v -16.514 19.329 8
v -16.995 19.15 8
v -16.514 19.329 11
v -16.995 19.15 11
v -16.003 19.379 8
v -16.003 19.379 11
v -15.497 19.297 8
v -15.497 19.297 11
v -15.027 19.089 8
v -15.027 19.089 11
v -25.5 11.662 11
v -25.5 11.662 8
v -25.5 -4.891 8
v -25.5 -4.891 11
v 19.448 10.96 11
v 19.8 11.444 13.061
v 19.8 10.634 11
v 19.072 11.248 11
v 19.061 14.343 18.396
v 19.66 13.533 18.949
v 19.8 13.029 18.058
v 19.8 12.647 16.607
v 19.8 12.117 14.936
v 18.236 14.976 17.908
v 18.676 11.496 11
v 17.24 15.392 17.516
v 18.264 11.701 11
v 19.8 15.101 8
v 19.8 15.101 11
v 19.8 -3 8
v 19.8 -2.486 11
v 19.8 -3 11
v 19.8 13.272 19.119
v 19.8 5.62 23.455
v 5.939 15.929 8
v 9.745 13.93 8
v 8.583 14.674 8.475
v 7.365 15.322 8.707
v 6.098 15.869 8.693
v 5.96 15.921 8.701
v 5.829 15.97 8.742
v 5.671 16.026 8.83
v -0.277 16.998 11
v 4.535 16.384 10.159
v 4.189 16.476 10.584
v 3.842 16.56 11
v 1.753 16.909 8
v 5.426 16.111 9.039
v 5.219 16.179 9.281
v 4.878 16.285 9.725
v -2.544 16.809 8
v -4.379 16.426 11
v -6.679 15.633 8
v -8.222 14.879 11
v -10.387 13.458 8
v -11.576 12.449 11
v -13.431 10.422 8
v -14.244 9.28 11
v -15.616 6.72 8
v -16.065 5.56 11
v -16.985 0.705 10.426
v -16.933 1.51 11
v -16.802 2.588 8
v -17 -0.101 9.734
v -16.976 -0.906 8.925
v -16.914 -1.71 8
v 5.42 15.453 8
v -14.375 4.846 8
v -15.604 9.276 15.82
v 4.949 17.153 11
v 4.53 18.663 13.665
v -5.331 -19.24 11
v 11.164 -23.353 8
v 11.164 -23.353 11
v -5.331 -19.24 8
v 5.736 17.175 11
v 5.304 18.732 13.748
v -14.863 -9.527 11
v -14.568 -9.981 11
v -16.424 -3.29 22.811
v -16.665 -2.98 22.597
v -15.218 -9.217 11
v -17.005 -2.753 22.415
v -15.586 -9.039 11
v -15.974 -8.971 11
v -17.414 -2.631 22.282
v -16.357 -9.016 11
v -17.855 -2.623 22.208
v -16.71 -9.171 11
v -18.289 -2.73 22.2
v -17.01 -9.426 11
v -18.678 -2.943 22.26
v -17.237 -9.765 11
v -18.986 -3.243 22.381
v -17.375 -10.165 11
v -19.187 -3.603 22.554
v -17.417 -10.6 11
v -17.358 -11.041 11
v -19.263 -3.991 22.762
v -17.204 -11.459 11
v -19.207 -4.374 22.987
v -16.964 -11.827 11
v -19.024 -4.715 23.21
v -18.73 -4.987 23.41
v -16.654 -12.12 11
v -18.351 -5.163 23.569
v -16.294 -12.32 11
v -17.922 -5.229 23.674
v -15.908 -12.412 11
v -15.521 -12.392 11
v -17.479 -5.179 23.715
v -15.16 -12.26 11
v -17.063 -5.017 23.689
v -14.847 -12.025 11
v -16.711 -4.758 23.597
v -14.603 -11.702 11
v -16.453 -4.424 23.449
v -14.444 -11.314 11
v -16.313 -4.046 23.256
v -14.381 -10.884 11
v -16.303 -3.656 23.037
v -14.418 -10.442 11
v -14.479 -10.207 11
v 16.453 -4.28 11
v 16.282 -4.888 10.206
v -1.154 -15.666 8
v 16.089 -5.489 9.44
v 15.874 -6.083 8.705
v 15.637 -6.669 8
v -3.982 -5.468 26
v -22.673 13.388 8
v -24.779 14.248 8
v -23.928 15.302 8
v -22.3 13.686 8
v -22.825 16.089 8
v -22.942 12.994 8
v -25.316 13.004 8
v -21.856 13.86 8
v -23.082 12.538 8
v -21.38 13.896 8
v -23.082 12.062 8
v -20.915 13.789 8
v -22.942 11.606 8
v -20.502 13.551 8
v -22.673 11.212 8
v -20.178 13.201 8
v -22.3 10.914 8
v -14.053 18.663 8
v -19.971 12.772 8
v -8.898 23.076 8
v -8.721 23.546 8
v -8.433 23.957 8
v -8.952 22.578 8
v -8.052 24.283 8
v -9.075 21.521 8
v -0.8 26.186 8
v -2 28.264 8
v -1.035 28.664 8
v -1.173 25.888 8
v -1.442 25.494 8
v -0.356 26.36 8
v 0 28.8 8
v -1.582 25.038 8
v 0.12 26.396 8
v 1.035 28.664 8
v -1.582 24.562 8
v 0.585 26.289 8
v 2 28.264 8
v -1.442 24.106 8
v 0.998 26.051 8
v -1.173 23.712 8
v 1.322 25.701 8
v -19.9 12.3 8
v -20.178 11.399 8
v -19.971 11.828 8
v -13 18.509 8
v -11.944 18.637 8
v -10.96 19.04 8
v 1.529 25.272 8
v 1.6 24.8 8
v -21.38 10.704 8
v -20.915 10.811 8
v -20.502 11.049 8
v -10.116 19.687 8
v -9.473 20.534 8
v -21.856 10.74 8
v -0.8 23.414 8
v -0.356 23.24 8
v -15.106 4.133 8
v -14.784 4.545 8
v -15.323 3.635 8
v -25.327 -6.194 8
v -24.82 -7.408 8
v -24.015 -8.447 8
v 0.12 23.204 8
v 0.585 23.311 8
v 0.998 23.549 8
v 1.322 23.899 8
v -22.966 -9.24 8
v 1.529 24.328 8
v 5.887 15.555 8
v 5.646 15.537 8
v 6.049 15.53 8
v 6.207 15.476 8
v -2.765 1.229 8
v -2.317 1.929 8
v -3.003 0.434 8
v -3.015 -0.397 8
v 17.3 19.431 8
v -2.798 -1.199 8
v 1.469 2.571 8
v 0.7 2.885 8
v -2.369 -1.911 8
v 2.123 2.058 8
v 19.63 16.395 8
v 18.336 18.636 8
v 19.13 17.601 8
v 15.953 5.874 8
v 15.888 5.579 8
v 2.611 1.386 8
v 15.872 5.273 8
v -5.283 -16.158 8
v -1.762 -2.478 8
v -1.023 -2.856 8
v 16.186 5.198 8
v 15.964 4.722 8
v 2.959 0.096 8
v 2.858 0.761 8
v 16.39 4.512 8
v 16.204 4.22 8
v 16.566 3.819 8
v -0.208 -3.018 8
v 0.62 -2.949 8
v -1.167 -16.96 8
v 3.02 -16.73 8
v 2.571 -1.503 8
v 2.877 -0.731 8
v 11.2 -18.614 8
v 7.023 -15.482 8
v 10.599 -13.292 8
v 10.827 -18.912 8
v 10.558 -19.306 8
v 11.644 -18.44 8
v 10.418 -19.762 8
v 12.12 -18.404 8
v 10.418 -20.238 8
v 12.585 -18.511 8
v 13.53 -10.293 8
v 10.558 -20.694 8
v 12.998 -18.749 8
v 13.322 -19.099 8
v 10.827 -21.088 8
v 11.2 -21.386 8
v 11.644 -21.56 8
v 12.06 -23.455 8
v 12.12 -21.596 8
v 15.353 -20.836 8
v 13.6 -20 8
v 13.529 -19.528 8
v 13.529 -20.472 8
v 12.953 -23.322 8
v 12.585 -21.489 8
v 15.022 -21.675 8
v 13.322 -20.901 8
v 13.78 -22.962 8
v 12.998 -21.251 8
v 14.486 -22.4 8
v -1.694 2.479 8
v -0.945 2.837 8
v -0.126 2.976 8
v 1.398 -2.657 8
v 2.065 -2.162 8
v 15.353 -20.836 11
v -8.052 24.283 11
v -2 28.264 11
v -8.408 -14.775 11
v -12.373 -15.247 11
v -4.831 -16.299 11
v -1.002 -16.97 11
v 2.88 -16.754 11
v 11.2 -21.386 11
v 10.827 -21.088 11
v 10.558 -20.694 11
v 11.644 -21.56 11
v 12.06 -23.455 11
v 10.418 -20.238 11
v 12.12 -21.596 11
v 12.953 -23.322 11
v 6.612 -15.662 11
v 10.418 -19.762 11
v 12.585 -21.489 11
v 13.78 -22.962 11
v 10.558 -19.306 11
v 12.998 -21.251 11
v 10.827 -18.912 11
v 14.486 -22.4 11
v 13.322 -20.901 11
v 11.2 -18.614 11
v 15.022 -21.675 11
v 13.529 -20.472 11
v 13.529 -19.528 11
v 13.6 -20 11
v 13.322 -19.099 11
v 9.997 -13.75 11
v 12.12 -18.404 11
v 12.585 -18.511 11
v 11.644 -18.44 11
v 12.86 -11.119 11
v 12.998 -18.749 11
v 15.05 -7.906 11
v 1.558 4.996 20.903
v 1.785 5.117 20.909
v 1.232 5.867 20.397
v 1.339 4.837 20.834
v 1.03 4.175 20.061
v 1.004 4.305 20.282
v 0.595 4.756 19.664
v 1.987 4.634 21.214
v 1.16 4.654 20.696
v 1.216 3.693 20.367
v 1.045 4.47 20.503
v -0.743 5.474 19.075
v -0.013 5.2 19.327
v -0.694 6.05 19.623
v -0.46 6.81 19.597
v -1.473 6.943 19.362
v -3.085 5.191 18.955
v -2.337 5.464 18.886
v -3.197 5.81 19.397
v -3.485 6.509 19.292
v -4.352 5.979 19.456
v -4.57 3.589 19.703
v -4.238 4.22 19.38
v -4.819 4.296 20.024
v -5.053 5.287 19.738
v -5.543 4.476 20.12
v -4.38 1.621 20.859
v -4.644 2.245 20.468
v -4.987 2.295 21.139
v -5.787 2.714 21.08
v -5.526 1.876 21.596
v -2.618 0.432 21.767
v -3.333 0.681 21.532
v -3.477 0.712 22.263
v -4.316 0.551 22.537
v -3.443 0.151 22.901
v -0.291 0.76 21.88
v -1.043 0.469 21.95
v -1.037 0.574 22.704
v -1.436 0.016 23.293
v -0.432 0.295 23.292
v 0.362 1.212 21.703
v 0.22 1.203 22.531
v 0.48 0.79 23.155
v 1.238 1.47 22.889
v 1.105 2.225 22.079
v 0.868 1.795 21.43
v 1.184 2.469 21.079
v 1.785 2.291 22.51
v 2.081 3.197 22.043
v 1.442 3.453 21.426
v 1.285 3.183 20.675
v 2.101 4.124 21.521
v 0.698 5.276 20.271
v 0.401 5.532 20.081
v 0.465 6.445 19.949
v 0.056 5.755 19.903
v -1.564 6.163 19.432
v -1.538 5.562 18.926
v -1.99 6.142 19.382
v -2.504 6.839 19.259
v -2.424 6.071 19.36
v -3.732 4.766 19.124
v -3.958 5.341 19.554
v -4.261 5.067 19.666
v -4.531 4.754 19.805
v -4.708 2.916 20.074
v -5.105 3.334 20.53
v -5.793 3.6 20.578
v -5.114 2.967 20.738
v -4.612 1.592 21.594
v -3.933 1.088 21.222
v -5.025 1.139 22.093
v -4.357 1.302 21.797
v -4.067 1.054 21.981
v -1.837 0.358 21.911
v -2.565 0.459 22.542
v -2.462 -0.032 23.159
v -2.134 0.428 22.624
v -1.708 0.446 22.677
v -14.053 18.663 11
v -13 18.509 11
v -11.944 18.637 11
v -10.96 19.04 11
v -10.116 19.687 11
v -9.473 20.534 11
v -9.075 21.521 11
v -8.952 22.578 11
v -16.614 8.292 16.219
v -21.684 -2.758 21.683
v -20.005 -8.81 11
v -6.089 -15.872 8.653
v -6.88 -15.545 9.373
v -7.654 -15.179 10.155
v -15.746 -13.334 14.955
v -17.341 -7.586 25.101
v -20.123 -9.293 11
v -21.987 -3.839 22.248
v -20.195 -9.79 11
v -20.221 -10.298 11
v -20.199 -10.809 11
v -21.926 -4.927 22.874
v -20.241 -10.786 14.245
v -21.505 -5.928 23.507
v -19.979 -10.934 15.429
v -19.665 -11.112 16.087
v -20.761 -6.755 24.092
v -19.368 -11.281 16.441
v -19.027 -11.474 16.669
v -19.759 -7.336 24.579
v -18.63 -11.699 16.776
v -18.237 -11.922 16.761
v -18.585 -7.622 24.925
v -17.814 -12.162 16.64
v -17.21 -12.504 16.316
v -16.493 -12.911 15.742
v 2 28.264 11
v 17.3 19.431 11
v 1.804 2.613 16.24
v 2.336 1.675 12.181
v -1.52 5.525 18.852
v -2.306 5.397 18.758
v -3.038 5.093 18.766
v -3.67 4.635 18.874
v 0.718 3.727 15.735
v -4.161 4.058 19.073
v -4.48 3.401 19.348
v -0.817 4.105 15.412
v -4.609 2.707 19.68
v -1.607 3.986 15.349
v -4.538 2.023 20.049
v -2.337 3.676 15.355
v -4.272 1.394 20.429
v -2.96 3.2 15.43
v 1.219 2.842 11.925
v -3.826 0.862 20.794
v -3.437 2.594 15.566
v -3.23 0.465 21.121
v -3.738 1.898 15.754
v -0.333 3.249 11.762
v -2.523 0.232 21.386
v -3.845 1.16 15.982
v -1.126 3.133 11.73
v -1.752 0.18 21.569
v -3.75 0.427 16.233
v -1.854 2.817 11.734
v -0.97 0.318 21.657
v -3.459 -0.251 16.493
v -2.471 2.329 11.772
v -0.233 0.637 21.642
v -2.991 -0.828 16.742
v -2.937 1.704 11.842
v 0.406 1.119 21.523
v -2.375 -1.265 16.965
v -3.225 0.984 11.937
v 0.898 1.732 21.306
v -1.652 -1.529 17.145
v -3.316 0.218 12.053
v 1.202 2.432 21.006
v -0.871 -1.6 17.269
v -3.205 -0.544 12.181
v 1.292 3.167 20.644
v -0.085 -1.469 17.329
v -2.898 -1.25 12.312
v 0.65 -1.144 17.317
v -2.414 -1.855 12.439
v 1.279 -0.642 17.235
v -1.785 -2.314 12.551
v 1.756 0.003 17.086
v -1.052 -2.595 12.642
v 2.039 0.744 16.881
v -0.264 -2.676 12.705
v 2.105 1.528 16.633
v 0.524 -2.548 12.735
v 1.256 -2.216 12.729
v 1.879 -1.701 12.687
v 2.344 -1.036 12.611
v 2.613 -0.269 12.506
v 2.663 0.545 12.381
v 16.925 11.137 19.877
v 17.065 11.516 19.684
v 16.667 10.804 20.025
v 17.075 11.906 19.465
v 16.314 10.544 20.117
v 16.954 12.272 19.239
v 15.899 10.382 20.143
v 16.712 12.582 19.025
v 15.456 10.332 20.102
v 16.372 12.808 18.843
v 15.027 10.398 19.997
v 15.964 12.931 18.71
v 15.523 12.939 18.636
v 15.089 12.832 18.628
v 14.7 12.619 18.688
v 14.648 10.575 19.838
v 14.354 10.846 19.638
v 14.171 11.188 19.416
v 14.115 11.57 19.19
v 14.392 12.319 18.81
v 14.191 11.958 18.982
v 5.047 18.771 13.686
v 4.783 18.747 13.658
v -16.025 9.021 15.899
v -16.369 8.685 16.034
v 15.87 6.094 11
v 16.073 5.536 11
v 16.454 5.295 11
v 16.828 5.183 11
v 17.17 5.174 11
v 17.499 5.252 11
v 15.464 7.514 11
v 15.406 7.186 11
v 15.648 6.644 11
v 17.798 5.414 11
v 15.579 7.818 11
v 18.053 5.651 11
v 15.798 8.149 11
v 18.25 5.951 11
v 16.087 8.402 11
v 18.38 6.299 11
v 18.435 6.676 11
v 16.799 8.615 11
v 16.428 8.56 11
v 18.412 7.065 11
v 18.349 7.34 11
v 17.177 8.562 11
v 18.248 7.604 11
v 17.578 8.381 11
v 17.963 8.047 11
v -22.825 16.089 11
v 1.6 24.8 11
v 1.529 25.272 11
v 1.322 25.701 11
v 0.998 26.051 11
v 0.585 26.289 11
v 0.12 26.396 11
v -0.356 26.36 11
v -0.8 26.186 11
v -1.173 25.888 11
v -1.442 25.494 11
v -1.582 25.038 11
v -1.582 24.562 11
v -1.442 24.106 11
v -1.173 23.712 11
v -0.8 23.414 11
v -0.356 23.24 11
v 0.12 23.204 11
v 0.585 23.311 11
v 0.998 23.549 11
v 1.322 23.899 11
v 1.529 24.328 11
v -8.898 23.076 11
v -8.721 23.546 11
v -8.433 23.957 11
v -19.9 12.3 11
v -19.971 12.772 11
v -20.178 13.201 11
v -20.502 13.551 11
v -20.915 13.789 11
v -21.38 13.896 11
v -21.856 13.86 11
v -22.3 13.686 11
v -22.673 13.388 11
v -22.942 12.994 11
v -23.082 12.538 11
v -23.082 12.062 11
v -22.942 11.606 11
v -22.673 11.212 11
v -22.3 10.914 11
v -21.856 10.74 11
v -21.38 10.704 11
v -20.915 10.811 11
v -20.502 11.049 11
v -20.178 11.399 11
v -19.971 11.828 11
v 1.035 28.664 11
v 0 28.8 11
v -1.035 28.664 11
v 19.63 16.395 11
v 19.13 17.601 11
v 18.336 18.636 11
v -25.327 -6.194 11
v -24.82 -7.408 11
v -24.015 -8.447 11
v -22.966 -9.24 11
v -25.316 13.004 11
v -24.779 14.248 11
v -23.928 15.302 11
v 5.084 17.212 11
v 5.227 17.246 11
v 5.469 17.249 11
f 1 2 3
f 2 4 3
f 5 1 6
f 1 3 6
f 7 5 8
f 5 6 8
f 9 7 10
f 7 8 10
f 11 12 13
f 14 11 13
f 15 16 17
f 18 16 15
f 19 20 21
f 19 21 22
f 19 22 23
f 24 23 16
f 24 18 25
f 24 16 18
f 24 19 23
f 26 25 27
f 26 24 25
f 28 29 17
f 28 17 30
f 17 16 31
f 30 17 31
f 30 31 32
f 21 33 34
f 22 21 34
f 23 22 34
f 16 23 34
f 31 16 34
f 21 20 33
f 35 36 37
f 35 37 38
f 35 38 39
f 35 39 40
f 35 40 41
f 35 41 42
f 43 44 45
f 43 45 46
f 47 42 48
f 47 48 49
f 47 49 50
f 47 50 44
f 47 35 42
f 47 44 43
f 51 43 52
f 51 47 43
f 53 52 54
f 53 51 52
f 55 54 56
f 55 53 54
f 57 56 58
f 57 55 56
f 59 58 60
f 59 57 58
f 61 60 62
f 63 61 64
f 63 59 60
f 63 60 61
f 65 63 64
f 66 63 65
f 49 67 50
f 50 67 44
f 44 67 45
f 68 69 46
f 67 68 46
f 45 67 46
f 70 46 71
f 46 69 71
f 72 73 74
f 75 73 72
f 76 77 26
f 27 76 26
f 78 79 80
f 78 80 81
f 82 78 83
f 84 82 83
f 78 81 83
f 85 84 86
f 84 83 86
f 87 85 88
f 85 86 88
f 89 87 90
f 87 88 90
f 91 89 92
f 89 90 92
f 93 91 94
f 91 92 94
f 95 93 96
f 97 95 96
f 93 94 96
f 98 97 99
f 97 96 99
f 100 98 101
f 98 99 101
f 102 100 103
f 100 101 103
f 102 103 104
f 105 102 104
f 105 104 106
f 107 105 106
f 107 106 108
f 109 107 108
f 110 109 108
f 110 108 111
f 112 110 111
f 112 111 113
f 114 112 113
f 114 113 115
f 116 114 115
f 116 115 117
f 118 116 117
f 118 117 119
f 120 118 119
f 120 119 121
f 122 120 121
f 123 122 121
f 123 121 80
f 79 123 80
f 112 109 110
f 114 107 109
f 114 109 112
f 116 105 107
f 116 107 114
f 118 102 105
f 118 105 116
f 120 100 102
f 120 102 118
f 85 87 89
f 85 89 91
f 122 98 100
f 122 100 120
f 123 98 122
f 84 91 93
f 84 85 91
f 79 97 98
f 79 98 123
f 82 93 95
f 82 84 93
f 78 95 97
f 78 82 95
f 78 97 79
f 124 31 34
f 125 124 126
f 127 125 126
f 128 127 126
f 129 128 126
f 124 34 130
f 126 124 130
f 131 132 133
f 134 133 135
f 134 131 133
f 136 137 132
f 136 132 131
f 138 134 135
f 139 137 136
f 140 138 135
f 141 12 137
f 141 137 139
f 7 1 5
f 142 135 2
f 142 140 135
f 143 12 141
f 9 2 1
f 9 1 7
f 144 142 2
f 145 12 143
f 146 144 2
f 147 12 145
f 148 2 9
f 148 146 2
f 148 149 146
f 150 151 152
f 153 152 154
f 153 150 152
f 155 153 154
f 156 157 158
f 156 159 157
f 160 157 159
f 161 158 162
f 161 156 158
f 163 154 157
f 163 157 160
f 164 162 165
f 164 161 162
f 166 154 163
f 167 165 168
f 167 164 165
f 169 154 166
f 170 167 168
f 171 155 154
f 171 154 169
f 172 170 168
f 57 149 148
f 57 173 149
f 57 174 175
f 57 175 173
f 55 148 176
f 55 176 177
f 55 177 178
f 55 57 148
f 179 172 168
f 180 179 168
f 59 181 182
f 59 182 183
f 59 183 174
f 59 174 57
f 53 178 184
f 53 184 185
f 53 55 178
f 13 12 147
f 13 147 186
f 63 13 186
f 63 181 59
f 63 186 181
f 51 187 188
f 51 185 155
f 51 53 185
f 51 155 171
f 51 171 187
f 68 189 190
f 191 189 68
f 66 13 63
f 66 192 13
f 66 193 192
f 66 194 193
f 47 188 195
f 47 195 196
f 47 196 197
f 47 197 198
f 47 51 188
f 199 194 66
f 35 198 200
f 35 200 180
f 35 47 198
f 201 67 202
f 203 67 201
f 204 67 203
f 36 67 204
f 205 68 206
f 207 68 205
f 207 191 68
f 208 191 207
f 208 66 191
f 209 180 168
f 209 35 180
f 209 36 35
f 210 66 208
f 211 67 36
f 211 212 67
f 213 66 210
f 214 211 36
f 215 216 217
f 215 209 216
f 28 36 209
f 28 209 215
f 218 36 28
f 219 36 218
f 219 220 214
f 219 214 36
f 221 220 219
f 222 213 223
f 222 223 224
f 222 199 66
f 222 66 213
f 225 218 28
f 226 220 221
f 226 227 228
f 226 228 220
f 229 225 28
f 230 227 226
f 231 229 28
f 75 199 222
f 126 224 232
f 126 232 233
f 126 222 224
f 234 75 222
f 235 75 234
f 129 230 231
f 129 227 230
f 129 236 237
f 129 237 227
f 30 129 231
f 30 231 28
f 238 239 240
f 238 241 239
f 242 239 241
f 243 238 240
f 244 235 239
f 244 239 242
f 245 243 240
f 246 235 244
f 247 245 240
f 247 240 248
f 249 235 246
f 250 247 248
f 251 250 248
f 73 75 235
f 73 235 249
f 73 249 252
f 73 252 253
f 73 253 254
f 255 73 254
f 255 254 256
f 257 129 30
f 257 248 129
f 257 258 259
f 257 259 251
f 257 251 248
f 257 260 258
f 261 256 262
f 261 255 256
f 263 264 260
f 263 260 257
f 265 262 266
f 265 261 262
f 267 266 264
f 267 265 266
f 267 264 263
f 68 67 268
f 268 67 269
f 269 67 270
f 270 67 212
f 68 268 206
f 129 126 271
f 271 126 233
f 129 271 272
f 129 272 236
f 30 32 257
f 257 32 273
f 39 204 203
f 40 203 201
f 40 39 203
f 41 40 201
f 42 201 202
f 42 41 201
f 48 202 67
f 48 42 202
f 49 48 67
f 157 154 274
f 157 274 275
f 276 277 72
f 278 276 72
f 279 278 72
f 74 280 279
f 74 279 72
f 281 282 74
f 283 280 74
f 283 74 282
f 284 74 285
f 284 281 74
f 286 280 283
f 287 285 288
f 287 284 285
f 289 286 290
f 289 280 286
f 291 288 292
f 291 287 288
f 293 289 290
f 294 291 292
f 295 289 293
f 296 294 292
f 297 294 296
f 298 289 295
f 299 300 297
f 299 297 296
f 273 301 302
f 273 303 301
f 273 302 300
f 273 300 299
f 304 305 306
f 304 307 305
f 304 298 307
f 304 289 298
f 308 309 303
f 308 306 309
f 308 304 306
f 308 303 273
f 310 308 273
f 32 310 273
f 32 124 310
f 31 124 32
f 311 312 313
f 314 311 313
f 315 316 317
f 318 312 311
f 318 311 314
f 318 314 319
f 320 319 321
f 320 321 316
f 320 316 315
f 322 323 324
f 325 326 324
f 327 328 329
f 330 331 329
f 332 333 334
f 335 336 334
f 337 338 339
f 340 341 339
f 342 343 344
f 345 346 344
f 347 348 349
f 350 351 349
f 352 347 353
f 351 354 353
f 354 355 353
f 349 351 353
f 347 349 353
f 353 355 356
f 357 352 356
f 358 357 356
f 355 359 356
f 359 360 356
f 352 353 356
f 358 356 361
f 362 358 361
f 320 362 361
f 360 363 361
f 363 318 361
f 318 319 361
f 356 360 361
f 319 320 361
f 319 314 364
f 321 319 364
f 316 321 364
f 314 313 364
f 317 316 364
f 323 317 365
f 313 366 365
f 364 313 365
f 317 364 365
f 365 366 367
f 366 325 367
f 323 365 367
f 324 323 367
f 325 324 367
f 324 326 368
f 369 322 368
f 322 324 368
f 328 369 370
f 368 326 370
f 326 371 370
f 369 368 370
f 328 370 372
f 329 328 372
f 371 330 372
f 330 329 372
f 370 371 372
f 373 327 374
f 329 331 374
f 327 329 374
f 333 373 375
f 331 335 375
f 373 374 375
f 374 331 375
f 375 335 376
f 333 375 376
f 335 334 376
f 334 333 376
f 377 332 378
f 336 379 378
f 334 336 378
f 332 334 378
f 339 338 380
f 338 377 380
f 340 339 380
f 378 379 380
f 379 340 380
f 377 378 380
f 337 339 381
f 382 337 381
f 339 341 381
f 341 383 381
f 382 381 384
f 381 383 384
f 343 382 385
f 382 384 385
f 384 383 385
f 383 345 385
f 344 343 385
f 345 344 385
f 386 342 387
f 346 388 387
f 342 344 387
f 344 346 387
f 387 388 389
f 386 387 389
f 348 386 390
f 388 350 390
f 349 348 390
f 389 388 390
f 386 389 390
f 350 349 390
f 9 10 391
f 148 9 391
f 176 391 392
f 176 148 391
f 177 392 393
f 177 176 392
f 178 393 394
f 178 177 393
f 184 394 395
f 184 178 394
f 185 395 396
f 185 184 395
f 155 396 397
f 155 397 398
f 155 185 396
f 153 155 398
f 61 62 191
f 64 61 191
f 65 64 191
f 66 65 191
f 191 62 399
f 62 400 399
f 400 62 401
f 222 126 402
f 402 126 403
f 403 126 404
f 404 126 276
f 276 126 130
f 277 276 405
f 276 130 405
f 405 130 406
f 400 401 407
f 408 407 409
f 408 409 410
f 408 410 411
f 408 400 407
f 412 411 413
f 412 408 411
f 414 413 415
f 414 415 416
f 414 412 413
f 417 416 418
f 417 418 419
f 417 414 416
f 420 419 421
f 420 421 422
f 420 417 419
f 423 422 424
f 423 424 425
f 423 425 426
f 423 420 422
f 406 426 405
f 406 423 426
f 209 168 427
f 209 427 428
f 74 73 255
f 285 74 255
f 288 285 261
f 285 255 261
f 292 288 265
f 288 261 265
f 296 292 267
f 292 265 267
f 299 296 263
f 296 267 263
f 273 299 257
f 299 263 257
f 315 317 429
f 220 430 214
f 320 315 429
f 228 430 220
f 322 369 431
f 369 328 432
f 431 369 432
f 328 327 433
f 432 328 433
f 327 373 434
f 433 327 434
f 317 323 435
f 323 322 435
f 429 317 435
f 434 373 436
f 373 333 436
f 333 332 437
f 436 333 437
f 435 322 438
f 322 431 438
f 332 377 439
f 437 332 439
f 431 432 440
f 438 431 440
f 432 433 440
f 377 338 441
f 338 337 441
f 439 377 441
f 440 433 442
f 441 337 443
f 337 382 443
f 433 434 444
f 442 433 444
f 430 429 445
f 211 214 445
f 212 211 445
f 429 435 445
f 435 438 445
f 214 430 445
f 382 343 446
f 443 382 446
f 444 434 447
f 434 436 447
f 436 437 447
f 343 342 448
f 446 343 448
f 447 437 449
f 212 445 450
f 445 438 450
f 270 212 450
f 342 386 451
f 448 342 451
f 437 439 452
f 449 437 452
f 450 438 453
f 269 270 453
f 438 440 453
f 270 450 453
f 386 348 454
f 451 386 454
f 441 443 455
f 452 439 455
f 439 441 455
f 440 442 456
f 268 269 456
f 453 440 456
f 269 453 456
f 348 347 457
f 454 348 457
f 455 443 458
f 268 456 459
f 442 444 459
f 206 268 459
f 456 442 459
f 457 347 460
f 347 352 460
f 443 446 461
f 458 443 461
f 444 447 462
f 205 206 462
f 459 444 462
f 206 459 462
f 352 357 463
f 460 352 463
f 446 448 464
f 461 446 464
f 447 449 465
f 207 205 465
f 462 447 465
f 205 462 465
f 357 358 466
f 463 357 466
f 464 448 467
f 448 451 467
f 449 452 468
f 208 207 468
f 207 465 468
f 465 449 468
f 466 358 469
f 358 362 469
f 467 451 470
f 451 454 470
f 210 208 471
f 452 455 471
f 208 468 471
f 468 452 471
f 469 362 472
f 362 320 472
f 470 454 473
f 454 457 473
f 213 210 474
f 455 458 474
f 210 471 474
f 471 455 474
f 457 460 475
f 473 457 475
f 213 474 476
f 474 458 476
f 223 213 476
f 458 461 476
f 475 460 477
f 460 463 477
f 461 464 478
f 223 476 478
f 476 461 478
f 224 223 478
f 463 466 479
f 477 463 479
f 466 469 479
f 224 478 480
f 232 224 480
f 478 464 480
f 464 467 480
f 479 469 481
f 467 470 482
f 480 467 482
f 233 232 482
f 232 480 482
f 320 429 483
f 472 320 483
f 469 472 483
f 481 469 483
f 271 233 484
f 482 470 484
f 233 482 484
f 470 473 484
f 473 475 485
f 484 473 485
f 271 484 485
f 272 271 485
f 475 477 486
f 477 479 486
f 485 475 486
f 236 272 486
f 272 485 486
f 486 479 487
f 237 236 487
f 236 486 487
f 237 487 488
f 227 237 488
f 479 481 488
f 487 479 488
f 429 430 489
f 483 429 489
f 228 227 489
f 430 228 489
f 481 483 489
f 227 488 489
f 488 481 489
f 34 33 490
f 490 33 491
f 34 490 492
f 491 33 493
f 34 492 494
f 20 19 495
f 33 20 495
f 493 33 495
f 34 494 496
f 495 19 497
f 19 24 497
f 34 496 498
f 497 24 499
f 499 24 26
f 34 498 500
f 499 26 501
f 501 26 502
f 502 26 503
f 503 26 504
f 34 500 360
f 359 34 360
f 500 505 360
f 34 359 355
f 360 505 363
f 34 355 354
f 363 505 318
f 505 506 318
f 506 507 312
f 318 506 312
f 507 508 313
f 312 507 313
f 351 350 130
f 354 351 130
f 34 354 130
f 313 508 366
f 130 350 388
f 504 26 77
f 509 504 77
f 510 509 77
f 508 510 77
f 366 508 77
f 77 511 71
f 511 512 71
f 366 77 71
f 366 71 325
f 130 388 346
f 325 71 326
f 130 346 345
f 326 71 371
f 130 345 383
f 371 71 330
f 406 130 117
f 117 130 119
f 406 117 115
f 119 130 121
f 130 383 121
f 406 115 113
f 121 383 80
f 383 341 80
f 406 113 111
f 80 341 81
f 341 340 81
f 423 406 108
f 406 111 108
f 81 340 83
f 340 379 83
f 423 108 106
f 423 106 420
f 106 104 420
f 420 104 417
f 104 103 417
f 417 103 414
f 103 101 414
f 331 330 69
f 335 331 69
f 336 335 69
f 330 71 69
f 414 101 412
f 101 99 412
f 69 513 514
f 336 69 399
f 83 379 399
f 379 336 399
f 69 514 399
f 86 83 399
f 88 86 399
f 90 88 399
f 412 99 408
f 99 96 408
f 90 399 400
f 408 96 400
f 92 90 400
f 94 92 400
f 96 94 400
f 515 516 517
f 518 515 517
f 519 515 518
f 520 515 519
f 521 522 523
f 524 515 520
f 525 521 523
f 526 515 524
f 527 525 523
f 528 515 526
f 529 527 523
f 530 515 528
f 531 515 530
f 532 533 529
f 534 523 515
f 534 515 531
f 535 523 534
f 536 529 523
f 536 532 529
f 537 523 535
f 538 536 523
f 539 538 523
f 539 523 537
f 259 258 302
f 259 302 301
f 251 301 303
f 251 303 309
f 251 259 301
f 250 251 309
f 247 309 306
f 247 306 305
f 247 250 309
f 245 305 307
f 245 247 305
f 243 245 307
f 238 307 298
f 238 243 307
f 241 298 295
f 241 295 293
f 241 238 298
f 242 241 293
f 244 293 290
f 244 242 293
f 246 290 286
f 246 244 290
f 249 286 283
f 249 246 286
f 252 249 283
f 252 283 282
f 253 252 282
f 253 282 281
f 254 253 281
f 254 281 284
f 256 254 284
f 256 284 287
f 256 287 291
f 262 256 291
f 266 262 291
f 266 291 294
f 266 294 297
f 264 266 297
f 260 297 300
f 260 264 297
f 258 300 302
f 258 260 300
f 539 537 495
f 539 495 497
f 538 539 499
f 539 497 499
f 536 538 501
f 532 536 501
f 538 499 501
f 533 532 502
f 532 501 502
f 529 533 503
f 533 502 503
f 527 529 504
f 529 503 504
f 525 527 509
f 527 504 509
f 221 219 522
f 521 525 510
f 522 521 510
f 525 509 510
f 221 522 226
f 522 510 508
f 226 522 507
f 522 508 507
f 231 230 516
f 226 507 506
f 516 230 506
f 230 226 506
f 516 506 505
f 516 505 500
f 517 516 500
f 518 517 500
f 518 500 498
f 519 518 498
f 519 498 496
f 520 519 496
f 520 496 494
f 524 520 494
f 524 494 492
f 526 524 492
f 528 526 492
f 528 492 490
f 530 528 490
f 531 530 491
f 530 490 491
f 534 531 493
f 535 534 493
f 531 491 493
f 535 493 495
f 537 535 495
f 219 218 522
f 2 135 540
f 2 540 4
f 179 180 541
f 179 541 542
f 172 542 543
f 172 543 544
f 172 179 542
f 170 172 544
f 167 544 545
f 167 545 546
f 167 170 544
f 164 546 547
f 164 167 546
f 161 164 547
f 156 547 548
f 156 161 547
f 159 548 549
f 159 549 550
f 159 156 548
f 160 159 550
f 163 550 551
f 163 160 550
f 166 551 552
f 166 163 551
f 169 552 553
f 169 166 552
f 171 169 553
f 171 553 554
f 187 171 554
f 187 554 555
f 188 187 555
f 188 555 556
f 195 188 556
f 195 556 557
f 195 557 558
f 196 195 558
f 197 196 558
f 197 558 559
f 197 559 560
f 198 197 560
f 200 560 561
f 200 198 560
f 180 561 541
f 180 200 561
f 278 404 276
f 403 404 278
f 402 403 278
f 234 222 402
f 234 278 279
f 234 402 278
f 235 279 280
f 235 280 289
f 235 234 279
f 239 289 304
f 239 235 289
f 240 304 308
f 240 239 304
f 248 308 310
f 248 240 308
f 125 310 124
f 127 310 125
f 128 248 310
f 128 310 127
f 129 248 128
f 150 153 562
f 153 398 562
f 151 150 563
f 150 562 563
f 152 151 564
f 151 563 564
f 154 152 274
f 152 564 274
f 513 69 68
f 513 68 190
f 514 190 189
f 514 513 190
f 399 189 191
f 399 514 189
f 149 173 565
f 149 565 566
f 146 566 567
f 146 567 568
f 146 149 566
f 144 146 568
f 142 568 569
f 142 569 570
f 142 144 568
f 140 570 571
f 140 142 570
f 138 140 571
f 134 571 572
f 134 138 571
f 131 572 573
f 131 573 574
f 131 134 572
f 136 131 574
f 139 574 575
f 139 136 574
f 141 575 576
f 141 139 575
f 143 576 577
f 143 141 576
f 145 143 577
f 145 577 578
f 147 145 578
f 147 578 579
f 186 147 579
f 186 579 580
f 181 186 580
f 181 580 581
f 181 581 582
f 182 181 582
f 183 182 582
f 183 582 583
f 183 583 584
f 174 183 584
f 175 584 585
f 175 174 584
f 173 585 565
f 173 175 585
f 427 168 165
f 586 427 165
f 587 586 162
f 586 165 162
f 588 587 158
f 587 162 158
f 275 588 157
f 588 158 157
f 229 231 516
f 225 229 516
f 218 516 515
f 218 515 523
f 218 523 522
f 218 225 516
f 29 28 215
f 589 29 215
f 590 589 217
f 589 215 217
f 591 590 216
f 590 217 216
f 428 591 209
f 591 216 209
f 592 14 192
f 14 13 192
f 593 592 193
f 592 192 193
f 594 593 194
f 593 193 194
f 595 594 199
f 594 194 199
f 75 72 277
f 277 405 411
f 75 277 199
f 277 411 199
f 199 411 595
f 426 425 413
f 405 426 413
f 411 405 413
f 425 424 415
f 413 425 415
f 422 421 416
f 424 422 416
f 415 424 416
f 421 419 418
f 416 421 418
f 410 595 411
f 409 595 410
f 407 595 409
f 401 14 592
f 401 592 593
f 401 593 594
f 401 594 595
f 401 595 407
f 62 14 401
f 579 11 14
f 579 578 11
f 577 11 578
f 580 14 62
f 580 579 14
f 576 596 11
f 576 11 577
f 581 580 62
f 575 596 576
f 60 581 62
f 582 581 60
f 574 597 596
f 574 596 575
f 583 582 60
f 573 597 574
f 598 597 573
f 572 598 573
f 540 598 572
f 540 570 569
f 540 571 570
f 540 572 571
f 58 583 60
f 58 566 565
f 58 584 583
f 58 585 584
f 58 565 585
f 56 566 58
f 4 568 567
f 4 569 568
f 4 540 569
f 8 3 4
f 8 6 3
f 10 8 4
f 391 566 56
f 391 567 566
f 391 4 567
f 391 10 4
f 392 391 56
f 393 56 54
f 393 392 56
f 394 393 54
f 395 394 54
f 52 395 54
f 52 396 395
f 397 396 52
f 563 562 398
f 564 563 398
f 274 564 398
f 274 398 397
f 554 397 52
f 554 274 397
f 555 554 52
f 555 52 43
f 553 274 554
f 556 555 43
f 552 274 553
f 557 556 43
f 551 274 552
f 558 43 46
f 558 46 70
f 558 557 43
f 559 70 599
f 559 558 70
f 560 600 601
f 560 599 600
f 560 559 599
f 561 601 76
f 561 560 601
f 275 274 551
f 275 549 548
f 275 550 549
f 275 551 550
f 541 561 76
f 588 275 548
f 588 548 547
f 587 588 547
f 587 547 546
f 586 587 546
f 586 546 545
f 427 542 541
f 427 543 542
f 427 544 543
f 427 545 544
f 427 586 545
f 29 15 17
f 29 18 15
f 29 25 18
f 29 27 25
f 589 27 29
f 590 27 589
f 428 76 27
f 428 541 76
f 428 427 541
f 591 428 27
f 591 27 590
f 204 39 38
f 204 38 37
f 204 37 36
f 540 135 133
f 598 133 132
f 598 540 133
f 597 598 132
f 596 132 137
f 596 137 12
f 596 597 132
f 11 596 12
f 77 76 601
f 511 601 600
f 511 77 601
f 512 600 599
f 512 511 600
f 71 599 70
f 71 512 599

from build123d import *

# Parameters (mm, degrees)
SKETCH037_R          = 1.6
SKETCH037_R_2        = 17
PAD006_DEPTH         = 3
SKETCH003_R          = 1.5
PAD007_DEPTH         = 22
SKETCH042_R          = 33.309059
POCKET028_DEPTH      = 18.95
SKETCH043_W          = 51.697506
SKETCH043_H          = 15.935999
POCKET029_DEPTH      = 28.801
POCKET029_DEPTH_BACK = 23.4566344398
SKETCH040_R          = 3
FILLET003_R          = 2
FILLET004_R          = 5
FILLET005_R          = 1


with BuildPart() as part:
    # Sketch037 → Pad006 (new body)
    with BuildSketch(Plane.XY.offset(8)):
        with BuildLine():
            Line((-25.5, 14.6837073124), (-25.5, -7.8162926876))
            Line((-5.3310209809, -19.2403151033), (-25.5, -7.8162926876))
            Line((11.1640063658, -23.3529873285), (-5.3310209809, -19.2403151033))
            ThreePointArc((11.1640063658, -23.3529873285), (13.7797833094, -22.9620568449), (15.3529873285, -20.8359936342))
            Line((19.8, -3), (15.3529873285, -20.8359936342))
            Line((19.8, 15.1005154776), (19.8, -3))
            ThreePointArc((19.8, 15.1005154776), (19.1301270189, 17.6005154776), (17.3, 19.4306424965))
            Line((2, 28.2641016151), (17.3, 19.4306424965))
            ThreePointArc((2, 28.2641016151), (0, 28.8), (-2, 28.2641016151))
            Line((-9.101080859, 23.5924155561), (-2, 28.2641016151))
            ThreePointArc((-15.8499401029, 19.751877), (-10.97303678, 19.0318958608), (-9.101080859, 23.5924155561))
            Line((-25.5, 14.6837073124), (-15.8499401029, 19.751877))
        make_face()
        with Locations((0, 24.8)):
            Circle(SKETCH037_R, mode=Mode.SUBTRACT)
        with Locations((12, -20)):
            Circle(SKETCH037_R, mode=Mode.SUBTRACT)
        with Locations((-21.5, 12.3)):
            Circle(SKETCH037_R, mode=Mode.SUBTRACT)
        Circle(SKETCH037_R_2, mode=Mode.SUBTRACT)
    extrude(amount=PAD006_DEPTH)

    # Sketch003 → Pad007 (join)
    with BuildSketch(Plane(origin=(-2.6, 10.8, 17), x_dir=(0.9021044144, 0.420580995, -0.0965362737), z_dir=(-0.1354559934, 0.4884043208, 0.8620399604))):
        with BuildLine():
            Line((-23.3696005315, -4.8773641565), (-13.621692219, 4.2127074032))
            ThreePointArc((-12.2576954989, 4.75), (-12.9906979524, 4.610835136), (-13.621692219, 4.2127074032))
            Line((-12.2576954989, 4.75), (10.0610339657, 4.75))
            ThreePointArc((10.780373766, 4.4446583705), (10.4517650942, 4.6705048535), (10.0610339657, 4.75))
            Line((10.780373766, 4.4446583705), (19.7793336026, -4.8740373329))
            ThreePointArc((21.0423045011, -8), (20.7146318466, -6.3142703296), (19.7793336026, -4.8740373329))
            Line((21.0423045011, -8), (21.0423045011, -15.35))
            ThreePointArc((20.0423045011, -16.35), (20.7494112823, -16.0571067812), (21.0423045011, -15.35))
            Line((20.0423045011, -16.35), (-8.9576954989, -16.35))
            Line((-8.9576954989, -16.35), (-21.8124305048, -12.0490416884))
            ThreePointArc((-23.3696005315, -4.8773641565), (-24.6301401013, -8.9059534041), (-21.8124305048, -12.0490416884))
        make_face()
        with Locations((16.5423045011, -8)):
            Circle(SKETCH003_R, mode=Mode.SUBTRACT)
        with Locations((-20.4576954989, -8)):
            Circle(SKETCH003_R, mode=Mode.SUBTRACT)
    extrude(amount=-PAD007_DEPTH)

    # Sketch042 → Pocket028 (cut, symmetric)
    with BuildSketch(Plane.XY.offset(8)):
        with Locations((0, 3.706026)):
            Circle(SKETCH042_R)
        with BuildLine():
            Line((-25.5, 14.6963702892), (-25.5, -7.8036297108))
            Line((-5.3310209809, -19.2403151033), (-25.5, -7.8036297108))
            Line((11.1640063658, -23.3529873285), (-5.3310209809, -19.2403151033))
            ThreePointArc((11.1640063658, -23.3529873285), (13.7797833094, -22.9620568449), (15.3529873285, -20.8359936342))
            Line((19.8, -3), (15.3529873285, -20.8359936342))
            Line((19.8, 15.1005154776), (19.8, -3))
            ThreePointArc((19.8, 15.1005154776), (19.1301270189, 17.6005154776), (17.3, 19.4306424965))
            Line((2, 28.2641016151), (17.3, 19.4306424965))
            ThreePointArc((2, 28.2641016151), (0, 28.8), (-2, 28.2641016151))
            Line((-25.5, 14.6963702892), (-2, 28.2641016151))
        make_face(mode=Mode.SUBTRACT)
    extrude(amount=POCKET028_DEPTH, both=True, mode=Mode.SUBTRACT)

    # Sketch043 → Pocket029 (cut, two sides)
    with BuildSketch(Plane.XZ) as pocket029_sk:
        with Locations((-1.406603, 0.0320005)):
            Rectangle(SKETCH043_W, SKETCH043_H)
    extrude(amount=-POCKET029_DEPTH, mode=Mode.SUBTRACT)
    extrude(pocket029_sk.sketch, amount=POCKET029_DEPTH_BACK, mode=Mode.SUBTRACT)

    # SubtractivePipe: sweep along a path in Sketch044
    with BuildLine(Plane(origin=(0, 0, 6), x_dir=(-0.3746065934, 0.9271838546, 0), z_dir=(0.9266190392, 0.3743783932, 0.0348994967))) as subtractivepipe_path:
        ThreePointArc((4.9840972168, 16.8364980654), (1.2784963095, 9.7214039712), (0, 1.801714))
    # Sketch040 → SubtractivePipe (sweep, cut)
    with BuildSketch(Plane(origin=(-2, 7.6, 8), x_dir=(0.8829475929, 0.4694715628, 0), z_dir=(0, 0, 1))):
        with Locations((-1.846382, -7.651343)):
            Circle(SKETCH040_R)
    sweep(path=subtractivepipe_path.line, mode=Mode.SUBTRACT)

    # Fillet003
    fillet003_edges = [part.edges().sort_by_distance(p)[0] for p in [
        (-9.101081, 23.592416, 9.5),
        (-15.84994, 19.751877, 9.5),
    ]]
    fillet(fillet003_edges, radius=FILLET003_R)

    # Fillet004
    fillet004_edges = [part.edges().sort_by_distance(p)[0] for p in [
        (-25.5, -7.80363, 9.5),
        (-25.5, 14.683707, 9.5),
    ]]
    fillet(fillet004_edges, radius=FILLET004_R)

    # Fillet005
    fillet005_edges = [part.edges().sort_by_distance(p)[0] for p in [
        (-4.660699, 2.190867, 21.553854),
    ]]
    fillet(fillet005_edges, radius=FILLET005_R)


solid = part.part
